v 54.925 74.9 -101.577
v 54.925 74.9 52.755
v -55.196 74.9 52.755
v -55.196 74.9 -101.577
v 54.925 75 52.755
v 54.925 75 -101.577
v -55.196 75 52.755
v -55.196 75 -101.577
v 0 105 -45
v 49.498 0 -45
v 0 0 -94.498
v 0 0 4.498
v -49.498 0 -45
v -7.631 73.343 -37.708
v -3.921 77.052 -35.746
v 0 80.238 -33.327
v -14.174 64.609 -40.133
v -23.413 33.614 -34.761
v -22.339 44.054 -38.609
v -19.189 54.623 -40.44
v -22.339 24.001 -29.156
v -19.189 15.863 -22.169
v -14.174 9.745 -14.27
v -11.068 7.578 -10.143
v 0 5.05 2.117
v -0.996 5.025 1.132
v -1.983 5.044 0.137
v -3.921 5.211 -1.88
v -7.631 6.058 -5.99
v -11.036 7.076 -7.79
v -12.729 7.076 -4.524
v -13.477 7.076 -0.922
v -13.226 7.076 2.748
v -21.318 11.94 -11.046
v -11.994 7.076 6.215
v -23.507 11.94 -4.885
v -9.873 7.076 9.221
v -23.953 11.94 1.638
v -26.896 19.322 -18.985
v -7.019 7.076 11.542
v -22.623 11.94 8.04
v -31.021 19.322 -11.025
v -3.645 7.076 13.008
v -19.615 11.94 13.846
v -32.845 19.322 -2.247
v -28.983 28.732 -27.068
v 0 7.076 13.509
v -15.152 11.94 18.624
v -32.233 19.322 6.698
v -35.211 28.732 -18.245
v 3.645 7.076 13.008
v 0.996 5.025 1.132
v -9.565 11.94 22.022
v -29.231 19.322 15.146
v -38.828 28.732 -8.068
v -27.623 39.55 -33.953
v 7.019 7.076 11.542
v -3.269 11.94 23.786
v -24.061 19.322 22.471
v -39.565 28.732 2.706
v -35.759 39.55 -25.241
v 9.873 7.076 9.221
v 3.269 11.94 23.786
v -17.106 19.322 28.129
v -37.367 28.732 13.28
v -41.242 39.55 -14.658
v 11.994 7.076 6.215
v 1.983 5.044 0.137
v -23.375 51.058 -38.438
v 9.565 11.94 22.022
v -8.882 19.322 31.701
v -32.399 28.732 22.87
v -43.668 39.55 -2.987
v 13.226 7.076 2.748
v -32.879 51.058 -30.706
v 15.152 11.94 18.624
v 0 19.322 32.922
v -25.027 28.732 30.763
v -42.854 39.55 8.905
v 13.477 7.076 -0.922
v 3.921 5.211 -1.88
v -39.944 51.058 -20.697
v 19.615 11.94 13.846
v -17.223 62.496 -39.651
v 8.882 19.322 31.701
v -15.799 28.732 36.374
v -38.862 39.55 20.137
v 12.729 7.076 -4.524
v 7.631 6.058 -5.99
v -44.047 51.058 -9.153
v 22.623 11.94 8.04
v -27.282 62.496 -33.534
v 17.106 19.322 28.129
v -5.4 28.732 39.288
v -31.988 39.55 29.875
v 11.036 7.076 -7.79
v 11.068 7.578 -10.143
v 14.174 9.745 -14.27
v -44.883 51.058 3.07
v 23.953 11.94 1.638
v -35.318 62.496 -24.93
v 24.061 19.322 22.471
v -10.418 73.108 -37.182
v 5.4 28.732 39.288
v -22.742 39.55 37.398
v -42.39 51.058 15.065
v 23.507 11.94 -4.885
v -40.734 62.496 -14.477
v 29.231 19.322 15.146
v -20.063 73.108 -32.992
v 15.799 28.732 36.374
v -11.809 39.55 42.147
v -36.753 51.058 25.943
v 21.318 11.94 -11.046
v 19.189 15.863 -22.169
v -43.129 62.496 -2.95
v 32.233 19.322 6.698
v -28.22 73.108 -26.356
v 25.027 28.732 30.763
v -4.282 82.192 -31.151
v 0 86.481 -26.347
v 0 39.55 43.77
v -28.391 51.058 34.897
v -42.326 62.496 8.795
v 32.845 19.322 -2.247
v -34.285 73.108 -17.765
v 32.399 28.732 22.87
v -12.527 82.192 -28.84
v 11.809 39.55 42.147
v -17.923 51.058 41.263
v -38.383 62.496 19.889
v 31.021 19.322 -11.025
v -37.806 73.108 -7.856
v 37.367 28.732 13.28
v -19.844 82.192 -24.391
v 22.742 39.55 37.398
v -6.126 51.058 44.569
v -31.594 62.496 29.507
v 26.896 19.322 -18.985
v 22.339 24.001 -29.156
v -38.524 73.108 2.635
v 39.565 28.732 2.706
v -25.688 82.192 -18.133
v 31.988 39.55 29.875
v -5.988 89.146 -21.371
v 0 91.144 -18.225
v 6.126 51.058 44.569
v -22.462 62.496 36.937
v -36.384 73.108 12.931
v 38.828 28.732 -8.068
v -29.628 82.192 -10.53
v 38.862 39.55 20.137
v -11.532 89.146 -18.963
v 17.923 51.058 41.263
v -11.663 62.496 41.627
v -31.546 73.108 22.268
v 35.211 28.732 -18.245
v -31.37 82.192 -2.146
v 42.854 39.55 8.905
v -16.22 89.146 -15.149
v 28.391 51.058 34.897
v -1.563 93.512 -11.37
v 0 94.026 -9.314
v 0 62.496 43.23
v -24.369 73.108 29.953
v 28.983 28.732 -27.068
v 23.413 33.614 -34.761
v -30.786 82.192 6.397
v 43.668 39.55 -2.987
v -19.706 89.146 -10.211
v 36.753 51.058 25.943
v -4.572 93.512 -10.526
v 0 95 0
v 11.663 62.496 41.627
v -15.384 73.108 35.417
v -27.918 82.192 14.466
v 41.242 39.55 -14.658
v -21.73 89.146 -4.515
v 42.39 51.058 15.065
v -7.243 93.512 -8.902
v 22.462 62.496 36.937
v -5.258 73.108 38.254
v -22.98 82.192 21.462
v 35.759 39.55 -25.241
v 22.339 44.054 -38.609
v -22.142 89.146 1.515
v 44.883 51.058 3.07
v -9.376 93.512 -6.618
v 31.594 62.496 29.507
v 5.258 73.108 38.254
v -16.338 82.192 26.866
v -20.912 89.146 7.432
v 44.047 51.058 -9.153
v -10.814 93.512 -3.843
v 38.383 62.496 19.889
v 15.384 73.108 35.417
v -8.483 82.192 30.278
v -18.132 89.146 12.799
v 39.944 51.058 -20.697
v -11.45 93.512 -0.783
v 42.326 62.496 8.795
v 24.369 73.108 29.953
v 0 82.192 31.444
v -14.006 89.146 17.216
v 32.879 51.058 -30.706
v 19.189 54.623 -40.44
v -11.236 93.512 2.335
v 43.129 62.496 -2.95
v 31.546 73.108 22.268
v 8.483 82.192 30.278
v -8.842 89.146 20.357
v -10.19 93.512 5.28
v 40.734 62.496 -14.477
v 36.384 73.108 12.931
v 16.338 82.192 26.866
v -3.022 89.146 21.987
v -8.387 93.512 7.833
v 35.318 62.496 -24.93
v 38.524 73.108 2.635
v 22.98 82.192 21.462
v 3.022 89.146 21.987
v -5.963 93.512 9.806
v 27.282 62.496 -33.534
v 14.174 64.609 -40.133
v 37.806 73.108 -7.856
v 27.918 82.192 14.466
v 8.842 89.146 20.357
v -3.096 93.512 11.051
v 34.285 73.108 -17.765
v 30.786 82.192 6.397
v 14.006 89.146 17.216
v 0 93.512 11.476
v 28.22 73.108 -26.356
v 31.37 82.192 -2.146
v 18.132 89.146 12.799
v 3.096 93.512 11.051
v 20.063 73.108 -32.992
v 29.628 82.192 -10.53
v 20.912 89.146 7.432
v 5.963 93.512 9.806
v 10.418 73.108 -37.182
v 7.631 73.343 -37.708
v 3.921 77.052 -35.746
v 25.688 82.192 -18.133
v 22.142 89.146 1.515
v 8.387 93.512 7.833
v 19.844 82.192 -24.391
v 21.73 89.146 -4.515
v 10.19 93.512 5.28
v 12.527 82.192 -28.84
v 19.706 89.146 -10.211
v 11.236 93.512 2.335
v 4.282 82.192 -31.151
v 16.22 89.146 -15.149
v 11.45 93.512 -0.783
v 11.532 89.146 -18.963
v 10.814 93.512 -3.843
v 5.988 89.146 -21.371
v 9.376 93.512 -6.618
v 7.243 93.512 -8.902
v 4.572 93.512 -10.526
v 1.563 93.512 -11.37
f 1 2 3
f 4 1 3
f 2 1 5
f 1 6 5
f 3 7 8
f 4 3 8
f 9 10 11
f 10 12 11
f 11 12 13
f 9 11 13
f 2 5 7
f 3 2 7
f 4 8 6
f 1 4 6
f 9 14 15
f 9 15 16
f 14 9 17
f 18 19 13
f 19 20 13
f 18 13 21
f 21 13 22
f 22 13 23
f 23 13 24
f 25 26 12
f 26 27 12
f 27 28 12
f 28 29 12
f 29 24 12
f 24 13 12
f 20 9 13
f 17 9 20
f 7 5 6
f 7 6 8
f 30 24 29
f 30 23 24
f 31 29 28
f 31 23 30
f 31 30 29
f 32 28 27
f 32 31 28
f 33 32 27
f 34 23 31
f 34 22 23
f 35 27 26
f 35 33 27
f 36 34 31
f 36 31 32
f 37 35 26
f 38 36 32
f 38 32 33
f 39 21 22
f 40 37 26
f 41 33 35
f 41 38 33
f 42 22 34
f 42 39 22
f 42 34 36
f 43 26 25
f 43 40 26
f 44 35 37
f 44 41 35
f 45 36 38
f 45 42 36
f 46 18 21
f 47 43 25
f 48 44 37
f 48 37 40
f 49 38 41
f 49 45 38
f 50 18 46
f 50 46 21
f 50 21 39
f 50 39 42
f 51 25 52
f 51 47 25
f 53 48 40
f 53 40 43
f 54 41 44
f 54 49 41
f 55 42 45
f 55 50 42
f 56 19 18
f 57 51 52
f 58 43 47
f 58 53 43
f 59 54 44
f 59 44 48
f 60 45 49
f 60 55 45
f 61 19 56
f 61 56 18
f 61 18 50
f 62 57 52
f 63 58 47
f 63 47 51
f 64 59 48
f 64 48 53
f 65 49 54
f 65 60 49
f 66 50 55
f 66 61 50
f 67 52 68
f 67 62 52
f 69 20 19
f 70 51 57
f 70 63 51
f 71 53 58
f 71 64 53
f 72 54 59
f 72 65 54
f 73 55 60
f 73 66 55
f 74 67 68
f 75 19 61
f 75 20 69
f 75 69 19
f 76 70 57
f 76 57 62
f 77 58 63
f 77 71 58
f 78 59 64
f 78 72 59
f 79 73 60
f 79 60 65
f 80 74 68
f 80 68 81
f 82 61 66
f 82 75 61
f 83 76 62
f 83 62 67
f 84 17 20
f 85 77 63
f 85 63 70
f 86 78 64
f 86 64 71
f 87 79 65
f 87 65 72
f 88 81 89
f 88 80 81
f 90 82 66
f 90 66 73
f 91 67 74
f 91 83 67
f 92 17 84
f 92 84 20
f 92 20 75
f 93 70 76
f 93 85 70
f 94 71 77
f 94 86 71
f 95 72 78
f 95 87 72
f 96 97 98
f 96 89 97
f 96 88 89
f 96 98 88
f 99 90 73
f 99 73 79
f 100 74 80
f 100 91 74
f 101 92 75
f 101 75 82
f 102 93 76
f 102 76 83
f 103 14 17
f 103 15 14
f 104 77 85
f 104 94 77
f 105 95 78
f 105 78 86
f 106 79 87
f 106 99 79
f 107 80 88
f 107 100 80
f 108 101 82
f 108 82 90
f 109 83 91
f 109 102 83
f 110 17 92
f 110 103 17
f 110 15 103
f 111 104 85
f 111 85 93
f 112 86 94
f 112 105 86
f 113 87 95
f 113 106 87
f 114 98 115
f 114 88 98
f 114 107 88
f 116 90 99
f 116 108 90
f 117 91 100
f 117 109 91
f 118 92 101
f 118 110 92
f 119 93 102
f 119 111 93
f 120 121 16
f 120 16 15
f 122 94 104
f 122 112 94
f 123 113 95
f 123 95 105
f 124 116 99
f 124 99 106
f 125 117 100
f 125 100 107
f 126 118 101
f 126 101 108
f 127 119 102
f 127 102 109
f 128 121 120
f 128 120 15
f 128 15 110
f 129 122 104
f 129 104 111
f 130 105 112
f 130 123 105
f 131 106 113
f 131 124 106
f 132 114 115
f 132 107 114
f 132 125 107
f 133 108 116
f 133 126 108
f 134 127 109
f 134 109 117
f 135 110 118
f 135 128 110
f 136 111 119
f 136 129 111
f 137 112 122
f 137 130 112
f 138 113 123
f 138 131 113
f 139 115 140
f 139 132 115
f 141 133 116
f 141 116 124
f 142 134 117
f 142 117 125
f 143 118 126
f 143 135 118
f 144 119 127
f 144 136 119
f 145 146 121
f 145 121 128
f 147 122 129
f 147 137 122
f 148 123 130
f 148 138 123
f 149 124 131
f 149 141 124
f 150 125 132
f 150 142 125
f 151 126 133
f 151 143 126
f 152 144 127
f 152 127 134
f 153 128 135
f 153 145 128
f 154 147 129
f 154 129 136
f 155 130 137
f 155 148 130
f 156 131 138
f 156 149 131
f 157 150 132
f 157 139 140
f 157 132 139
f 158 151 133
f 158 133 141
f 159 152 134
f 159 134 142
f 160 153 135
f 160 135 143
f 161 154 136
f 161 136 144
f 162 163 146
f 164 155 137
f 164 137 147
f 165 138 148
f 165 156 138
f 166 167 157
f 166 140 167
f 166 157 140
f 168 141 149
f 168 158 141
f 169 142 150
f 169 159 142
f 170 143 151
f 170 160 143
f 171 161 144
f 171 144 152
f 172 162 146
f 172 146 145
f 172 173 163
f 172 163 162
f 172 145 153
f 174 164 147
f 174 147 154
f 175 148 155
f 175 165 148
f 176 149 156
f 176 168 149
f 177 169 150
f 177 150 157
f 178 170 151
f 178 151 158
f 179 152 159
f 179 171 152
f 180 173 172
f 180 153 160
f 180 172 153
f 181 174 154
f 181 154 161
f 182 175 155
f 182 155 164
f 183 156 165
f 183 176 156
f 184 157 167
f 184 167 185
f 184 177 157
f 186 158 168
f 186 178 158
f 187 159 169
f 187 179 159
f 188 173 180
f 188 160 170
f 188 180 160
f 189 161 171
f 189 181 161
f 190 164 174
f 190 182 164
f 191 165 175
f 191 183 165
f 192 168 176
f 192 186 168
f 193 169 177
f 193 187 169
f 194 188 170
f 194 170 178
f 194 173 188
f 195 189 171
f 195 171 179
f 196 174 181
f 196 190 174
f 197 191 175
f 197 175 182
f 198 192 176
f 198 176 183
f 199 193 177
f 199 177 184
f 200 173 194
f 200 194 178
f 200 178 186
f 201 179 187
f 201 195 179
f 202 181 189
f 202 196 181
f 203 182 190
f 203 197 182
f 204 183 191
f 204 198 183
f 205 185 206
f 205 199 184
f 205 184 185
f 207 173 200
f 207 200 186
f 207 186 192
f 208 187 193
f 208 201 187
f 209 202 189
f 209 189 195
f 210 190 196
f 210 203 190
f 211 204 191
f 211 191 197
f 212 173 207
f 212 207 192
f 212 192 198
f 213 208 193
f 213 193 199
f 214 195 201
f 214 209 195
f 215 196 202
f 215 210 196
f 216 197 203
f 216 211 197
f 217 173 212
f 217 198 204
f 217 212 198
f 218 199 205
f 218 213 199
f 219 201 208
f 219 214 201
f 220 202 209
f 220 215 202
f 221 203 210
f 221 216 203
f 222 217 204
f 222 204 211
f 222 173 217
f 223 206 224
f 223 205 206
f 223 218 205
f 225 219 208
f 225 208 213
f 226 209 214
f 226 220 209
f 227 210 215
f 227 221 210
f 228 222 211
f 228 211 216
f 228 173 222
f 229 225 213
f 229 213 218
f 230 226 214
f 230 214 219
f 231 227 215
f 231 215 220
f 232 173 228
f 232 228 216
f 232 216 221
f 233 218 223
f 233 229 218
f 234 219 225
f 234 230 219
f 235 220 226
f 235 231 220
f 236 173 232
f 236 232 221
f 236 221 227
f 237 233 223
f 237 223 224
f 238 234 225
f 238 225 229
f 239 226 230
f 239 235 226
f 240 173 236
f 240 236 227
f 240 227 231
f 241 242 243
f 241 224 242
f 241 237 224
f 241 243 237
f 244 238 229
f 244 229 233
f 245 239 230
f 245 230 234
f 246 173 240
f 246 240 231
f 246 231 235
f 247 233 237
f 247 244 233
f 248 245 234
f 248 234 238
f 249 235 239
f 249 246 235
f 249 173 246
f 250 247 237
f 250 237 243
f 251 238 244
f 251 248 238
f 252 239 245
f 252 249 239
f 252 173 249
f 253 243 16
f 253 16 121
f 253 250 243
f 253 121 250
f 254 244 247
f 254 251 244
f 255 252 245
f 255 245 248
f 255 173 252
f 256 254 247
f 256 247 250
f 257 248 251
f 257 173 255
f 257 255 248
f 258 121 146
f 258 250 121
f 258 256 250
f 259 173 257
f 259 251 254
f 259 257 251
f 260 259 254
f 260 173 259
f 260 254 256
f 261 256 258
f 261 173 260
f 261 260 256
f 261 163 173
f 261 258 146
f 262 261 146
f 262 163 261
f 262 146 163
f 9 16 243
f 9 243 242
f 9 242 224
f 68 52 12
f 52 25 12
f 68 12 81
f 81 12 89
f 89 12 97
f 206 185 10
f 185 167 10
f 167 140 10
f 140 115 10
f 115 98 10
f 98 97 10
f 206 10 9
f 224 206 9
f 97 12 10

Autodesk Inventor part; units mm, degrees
ref_plane "YZ Plane" through (0, 0, 0) normal (1, 0, 0) x (0, 1, 0)
ref_plane "XY Plane" through (0, 0, 0) normal (0, 0, 1) x (1, 0, 0)
sketch "Эскиз1" plane through (0, 0, 0) normal (0, 0, 1) x (1, 0, 0)
  point P0 (0, 0)
sketch "Эскиз2" plane through (0, 0, 0) normal (1, 0, 0) x (0, 1, 0)
  circle A0 centre (50, 0) radius 45
  line L0 (5, 0) -> (95, 0)
  point P0 (0, 0)
revolve "Вращение1" add sketch "Эскиз2" angle 360 about axis through (0, 5, 0) along (0, 1, 0) picked at (45.3647, -14.2658) contours A0 L0
sketch "Эскиз3" plane through (0, 0, 0) normal (0, 1, 0) x (-1, 0, 0)
  line L0 (0, 4.4975) -> (49.4975, -45)
  line L1 (49.4975, -45) -> (0, -94.4975)
  line L2 (0, -94.4975) -> (-49.4975, -45)
  line L3 (-49.4975, -45) -> (0, 4.4975)
  point P0 (0, 0)
  point P1 (0, -45)
ref_plane "РабПлоскость2" through (0, 105, 0) normal (0, 1, 0) x (-1, 0, 0)
ref_plane "РабПлоскость1" through (0, 75, 0) normal (0, 1, 0) x (-1, 0, 0)
sketch "Эскиз4" plane through (0, 105, 0) normal (0, 1, 0) x (-1, 0, 0)
  point P0 (0, 0)
  point P1 (0, -45)
loft "Лофт1" add profiles "Эскиз3" section 1 point at (0, 105, -45)
sketch "Эскиз6" plane through (0, 75, 0) normal (0, 1, 0) x (-1, 0, 0)
  point P0 (0, 0)
sketch "Эскиз8" plane through (0, 75, 0) normal (0, 1, 0) x (-1, 0, 0)
  line L0 (55.196, -101.5768) -> (-54.9247, -101.5768)
  line L1 (-54.9247, -101.5768) -> (-54.9247, 52.7549)
  line L2 (-54.9247, 52.7549) -> (55.196, 52.7549)
  line L3 (55.196, 52.7549) -> (55.196, -101.5768)
  point P0 (0, 0)
extrude "Выдавливание3" add sketch "Эскиз8" against normal blind 0.1 separate body
properties part number "а"
